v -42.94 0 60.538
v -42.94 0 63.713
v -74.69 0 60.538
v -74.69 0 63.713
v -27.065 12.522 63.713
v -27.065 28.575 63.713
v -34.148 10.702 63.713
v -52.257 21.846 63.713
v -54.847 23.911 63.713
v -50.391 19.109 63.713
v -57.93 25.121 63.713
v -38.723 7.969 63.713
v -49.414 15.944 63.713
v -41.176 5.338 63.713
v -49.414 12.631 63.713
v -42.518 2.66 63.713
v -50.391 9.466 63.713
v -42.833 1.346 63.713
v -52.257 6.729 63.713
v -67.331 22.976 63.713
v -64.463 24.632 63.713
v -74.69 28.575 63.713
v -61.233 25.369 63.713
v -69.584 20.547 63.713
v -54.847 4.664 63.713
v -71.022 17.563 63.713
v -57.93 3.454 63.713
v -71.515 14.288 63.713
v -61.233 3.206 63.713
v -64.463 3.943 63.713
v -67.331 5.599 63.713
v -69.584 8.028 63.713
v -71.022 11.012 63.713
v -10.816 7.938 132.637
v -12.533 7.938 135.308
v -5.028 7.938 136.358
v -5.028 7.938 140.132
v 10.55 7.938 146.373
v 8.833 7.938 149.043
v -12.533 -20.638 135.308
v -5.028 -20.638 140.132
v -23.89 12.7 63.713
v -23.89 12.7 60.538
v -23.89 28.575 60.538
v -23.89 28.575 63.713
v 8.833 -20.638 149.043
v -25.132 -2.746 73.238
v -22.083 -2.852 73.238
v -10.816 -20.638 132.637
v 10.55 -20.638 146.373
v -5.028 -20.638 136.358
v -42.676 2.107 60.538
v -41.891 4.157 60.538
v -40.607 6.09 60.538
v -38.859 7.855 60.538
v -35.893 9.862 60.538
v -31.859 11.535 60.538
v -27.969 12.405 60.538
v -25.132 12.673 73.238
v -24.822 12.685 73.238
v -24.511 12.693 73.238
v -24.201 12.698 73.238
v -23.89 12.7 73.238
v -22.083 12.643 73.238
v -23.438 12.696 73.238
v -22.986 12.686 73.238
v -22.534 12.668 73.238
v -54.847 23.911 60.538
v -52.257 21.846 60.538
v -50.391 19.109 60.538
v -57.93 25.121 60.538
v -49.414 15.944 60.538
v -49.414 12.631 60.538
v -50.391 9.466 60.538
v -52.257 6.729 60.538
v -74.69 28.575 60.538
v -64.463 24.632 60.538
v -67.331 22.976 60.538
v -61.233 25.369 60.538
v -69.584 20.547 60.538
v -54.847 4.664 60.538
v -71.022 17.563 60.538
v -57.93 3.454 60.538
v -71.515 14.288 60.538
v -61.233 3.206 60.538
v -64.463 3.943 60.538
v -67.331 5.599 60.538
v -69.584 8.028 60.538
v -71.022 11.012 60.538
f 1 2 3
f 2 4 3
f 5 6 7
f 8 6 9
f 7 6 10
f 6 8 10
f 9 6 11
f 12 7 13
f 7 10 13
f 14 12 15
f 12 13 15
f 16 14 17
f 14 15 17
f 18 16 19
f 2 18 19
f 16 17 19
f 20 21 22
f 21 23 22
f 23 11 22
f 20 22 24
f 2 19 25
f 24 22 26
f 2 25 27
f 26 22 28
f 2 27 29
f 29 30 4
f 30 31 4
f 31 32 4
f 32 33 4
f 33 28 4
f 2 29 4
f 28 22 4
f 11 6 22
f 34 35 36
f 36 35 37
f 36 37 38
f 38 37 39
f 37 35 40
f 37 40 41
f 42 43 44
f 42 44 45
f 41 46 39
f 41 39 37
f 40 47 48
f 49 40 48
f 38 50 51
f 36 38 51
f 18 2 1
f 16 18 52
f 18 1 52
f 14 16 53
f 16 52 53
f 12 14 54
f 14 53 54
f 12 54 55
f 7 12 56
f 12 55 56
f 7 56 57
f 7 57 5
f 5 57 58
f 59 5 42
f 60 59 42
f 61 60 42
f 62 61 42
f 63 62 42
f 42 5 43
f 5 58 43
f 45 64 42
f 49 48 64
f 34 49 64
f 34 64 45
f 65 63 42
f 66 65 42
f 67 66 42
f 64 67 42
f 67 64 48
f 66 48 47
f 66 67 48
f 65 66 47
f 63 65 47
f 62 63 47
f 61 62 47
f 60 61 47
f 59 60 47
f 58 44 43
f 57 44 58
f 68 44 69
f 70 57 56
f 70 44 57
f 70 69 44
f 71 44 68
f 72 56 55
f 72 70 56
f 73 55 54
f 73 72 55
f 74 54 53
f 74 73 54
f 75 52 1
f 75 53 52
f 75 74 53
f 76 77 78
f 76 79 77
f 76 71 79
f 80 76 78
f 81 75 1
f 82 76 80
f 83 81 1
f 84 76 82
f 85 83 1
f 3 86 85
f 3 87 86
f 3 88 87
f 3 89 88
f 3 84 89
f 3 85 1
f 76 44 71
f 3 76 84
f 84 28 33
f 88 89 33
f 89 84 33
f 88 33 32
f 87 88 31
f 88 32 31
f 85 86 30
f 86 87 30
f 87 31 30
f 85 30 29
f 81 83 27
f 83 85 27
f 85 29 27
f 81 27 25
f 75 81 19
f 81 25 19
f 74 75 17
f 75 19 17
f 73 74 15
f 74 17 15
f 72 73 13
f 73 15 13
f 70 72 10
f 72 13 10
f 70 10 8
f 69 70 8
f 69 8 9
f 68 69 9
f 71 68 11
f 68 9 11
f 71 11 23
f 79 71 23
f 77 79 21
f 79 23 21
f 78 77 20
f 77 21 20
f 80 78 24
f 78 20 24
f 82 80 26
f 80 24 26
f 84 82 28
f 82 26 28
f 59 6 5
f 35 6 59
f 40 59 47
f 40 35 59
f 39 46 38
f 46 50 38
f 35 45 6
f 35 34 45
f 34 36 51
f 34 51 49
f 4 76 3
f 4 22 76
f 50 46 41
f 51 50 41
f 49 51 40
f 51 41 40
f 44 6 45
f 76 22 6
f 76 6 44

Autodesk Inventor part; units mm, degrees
ref_plane "YZ Plane" through (0, 0, 0) normal (1, 0, 0) x (0, 1, 0)
ref_plane "XZ Plane" through (0, 0, 0) normal (0, 1, 0) x (-1, 0, 0)
sketch "Sketch1" plane through (0, 0, 0) normal (0, 1, 0) x (-1, 0, 0)
  line L0 (43.0137, 64.3915) -> (32.1817, 14.8739)
  line L1 (-10.5502, -12.5966) -> (-8.8333, -15.2673)
  line L2 (-8.8333, -15.2673) -> (35.0028, 12.913)
  line L3 (35.0028, 12.913) -> (46.1153, 63.713)
  line L4 (46.1153, 63.713) -> (43.0137, 64.3915)
  line L5 (-10.5502, -12.5966) -> (-10.5502, 12.913)
  line L6 (-10.5502, -12.5966) -> (32.1817, 14.8739)
  line L7 (46.1153, 63.713) -> (74.6903, 63.713)
  line L8 (74.6903, 63.713) -> (74.6903, 66.888)
  line L9 (74.6903, 66.888) -> (43.5598, 66.888)
  line L10 (43.0137, 64.3915) -> (43.5598, 66.888)
  point P0 (0, 0)
  dimension "d0" = 3.175
  dimension "d1" = 3.175
  dimension "d3" = 50.8
  dimension "d4" = 57.265
  dimension "d5" = 50.8
  dimension "d6" = 11.1125
  dimension "d7" = 28.575
  dimension "d8" = 3.175
extrude "Extrusion1" add sketch "Sketch1" along normal blind 28.575
sketch "Sketch2" plane through (-74.6903, 0, 66.888) normal (0, 0, 1) x (1, 0, 0)
  line L0 (28.575, 0) -> (0, 0) projected
  line L1 (0, 0) -> (0, 28.575) projected
  line L2 (28.575, 28.575) -> (0, 28.575) projected
  line L3 (28.575, 0) -> (28.575, 28.575) projected
  line L4 (28.575, 28.575) -> (0, 28.575) projected
  line L5 (0, 0) -> (0, 28.575) projected
  circle A0 centre (14.2875, 14.2875) radius 11.1125
  point P0 (74.6903, 0)
  point P1 (14.2875, 28.575)
  point P2 (0, 14.2875)
  dimension "d11" = 22.225
extrude "Extrusion2" cut sketch "Sketch2" against normal blind 28.575 contours A0
sketch "Sketch3" plane through (10.5502, 0, -12.5966) normal (0.5407576, 0, 0.8411785) x (0.8411785, 0, -0.5407576)
  line L0 (-50.8, 0) -> (-50.8, 28.575) projected
  line L1 (-50.8, 7.9375) -> (0, 7.9375)
  line L2 (0, 7.9375) -> (0, -20.6375)
  line L3 (0, -20.6375) -> (-50.8, -20.6375)
  line L4 (-50.8, -20.6375) -> (-50.8, 7.9375)
  line L5 (-50.8, 28.575) -> (0, 28.575) projected
  point P0 (-15.6863, 0)
  dimension "d14" = 50.8
  dimension "d15" = 28.575
  dimension "d16" = 20.6375
sketch "Sketch4" plane through (-32.1817, 0, 14.8739) normal (0.9769, 0, 0.2136969) x (0.2136969, 0, -0.9769)
  line L0 (-53.2441, 0) -> (-53.2441, 28.575) projected
  line L1 (-53.2441, 28.575) -> (0, 7.9375)
  line L2 (0, 0) -> (0, 28.575) projected
  line L3 (0, 7.9375) -> (0, -20.6375)
  line L4 (0, -20.6375) -> (-53.2441, 0)
  line L5 (-53.2441, 28.575) -> (-53.2441, 0)
  point P0 (21.4074, 0)
  dimension "d17" = 20.6375
  dimension "d18" = 28.575
sketch "Sketch5" plane through (-32.1817, 0, 14.8739) normal (0.9769, 0, 0.2136969) x (0.2136969, 0, -0.9769)
  line L0 (-53.2441, 41.9678) -> (42.8737, 41.9678)
  line L1 (42.8737, 41.9678) -> (42.8737, -28.4609)
  line L2 (42.8737, -28.4609) -> (-53.2441, -28.4609)
  line L3 (-53.2441, -28.4609) -> (-53.2441, 41.9678)
  point P0 (21.4074, 0)
extrude "Extrusion3" cut sketch "Sketch5" along normal blind 50.8 and the other way blind 3.175
extrude "Extrusion4" add sketch "Sketch4" against normal blind 3.175
extrude "Extrusion5" add sketch "Sketch3" against normal blind 3.175
sketch "Sketch6" plane through (8.8333, 0, -15.2673) normal (-0.5407576, 0, -0.8411785) x (-0.8411785, 0, 0.5407576)
  line L0 (50.8, 7.9375) -> (0, 7.9375) projected
  line L1 (50.8, 7.9375) -> (63.8738, 7.9375)
  line L2 (63.8738, 7.9375) -> (63.8738, -20.6375)
  line L3 (63.8738, -20.6375) -> (50.8, -20.6375)
  line L4 (50.8, -20.6375) -> (50.8, 7.9375)
  point P0 (15.6863, 0)
extrude "Extrusion6" add sketch "Sketch6" against normal blind 3.175
sketch "Sketch7" plane through (-35.2833, 0, 14.1954) normal (-0.9769, 0, -0.2136969) x (-0.2136969, 0, 0.9769)
  line L0 (50.6885, 27.5845) -> (0, 7.9375) projected
  line L1 (3.1832, -19.4037) -> (53.2441, 0) projected
  line L2 (0, 7.9375) -> (3.1832, 7.9375) projected
  line L3 (0, 7.9375) -> (-56.9759, -14.1465)
  line L4 (-56.9759, -14.1465) -> (-50.1301, -40.068)
  line L5 (53.2441, 0) -> (0, -20.6375) projected
  line L6 (-50.1301, -40.068) -> (0, -20.6375)
  line L7 (0, 7.9375) -> (-35.9676, 7.9375) projected
  line L8 (0, 7.9375) -> (0, -20.6375)
  line L9 (11.5155, 12.4009) -> (21.1446, -12.4418)
  line L10 (-34.1585, 31.8696) -> (27.6424, 31.8696)
  line L11 (27.6424, 31.8696) -> (27.6424, -37.0154)
  line L12 (27.6424, -37.0154) -> (-34.1585, -37.0154)
  line L13 (-34.1585, -37.0154) -> (-34.1585, 31.8696)
  point P0 (-21.4074, 0)
extrude "Extrusion7" cut sketch "Sketch7" along normal blind 25.4 contours L9 L1 L5 L8 L0 | L0 L7 L13 L10 L11 | L0 L11 L1 L9 | L8 L6 L13 L3 | L3 L13 L7 | L1 L11 L12 L13 L6 L5
mirror "Mirror1" about plane through (-74.6903, 0, 66.888) normal (0, 0, 1)
sketch "Sketch8" plane through (0, 28.575, 0) normal (0, 1, 0) x (1, 0, 0)
  line L0 (-74.6903, -63.713) -> (-74.6903, -70.063) projected
  line L1 (-74.6903, -66.888) -> (15.7413, -66.888)
  line L2 (15.7413, -66.888) -> (15.7413, 23.0839)
  line L3 (15.7413, 23.0839) -> (-74.6903, 23.0839)
  line L4 (-74.6903, 23.0839) -> (-74.6903, -66.888)
  point P0 (0, 0)
extrude "Extrusion8" cut sketch "Sketch8" against normal blind 49.2125
ref_plane "Work Plane1" through (-7.3684, -20.6375, 113.4742) normal (0.9769, 0, -0.2136969) x (-0.2136969, 0, -0.9769)
sketch "Sketch10" plane through (0, 28.575, 0) normal (0, 1, 0) x (1, 0, 0)
  line L0 (-1.9264, -138.3519) -> (-5.0281, -139.0304)
  line L1 (-1.9264, -138.3519) -> (-13.3045, -86.3378) projected
  line L2 (-46.6614, -54.5282) -> (-5.0281, -54.5282)
  line L3 (-5.0281, -54.5282) -> (-5.0281, -144.0467)
  line L4 (-5.0281, -144.0467) -> (-46.6614, -144.0467)
  line L5 (-46.6614, -144.0467) -> (-46.6614, -54.5282)
  point P0 (0, 0)
  dimension "d35" = 3.175
extrude "Extrusion9" cut sketch "Sketch10" against normal blind 57.15 contours L3 L4 L5 L2
sketch "Sketch11" plane through (0, 28.575, 0) normal (0, 1, 0) x (1, 0, 0)
  line L0 (-74.6903, -66.888) -> (-46.6614, -66.888) projected
  line L1 (-46.6614, -66.888) -> (-46.1153, -66.888)
  line L2 (-46.1153, -66.888) -> (-46.1153, -70.063)
  line L3 (-46.1153, -70.063) -> (-46.6614, -70.063)
  line L4 (-46.6614, -70.063) -> (-46.6614, -66.888)
  line L5 (-74.6903, -66.888) -> (-74.6903, -70.063) projected
  point P0 (0, 0)
  dimension "d38" = 28.575
extrude "Extrusion10" add sketch "Sketch11" against normal up to surface (28.575 mm away)
sketch "Sketch12" plane through (-74.6903, 0, 66.888) normal (0, 0, -1) x (-1, 0, 0)
  line L0 (0, 0) -> (-28.575, 0) projected
  line L1 (0, 28.575) -> (0, 0) projected
  line L2 (-28.575, 28.575) -> (0, 28.575) projected
  line L3 (-28.575, 28.575) -> (-28.575, 0) projected
  circle A0 centre (-14.2875, 14.2875) radius 11.1125 projected
  point P0 (-74.6903, 0)
extrude "Extrusion11" add sketch "Sketch12" along normal blind 6.35
sketch "Sketch13" plane through (-74.6903, 0, 70.063) normal (0, 0, 1) x (1, 0, 0)
  line L0 (28.575, 28.575) -> (0, 28.575) projected
  line L1 (0, 0) -> (0, 28.575) projected
  line L2 (28.575, 0) -> (0, 0) projected
  line L3 (28.575, 28.575) -> (28.575, 0) projected
  circle A0 centre (14.2875, 14.2875) radius 11.1125 projected
  point P0 (74.6903, 0)
extrude "Extrusion12" cut sketch "Sketch13" against normal blind 6.35
sketch "Sketch14" plane through (-7.3684, -20.6375, 113.4742) normal (0.9769, 0, -0.2136969) x (-0.2136969, 0, -0.9769)
  line L0 (-22.8553, 28.575) -> (-26.5426, 28.575) projected
  line L1 (59.9935, 49.2125) -> (59.9935, 20.6375) projected
  line L2 (-22.8553, 28.575) -> (59.9935, 49.2125)
  line L3 (59.9935, 20.6375) -> (66.0999, 20.6375) projected
  line L4 (59.9935, 49.2125) -> (59.9935, 20.6375)
  line L5 (-22.8553, 0) -> (-22.8553, 28.575) projected
  line L6 (59.9935, 20.6375) -> (-22.8553, 0)
  line L7 (-22.8553, 0) -> (-22.8553, 28.575)
  point P0 (109.2784, 20.6375)
extrude "Extrusion13" add sketch "Sketch14" against normal blind 3.175
sketch "Sketch16" plane through (-46.1153, 0, 60.538) normal (1, 0, 0) x (0, 0, -1)
  line L0 (-3.175, 28.575) -> (-3.175, 0) projected
  line L1 (-3.175, 0) -> (0, 0) projected
  line L2 (0, 28.575) -> (0, 0) projected
  line L3 (-3.175, 28.575) -> (0, 28.575) projected
  point P0 (60.538, 0)
extrude "Extrusion14" add sketch "Sketch16" along normal blind 33.3375
sketch "Sketch17" plane through (-7.3684, -20.6375, 113.4742) normal (0.9769, 0, -0.2136969) x (-0.2136969, 0, -0.9769)
  line L0 (39.8727, 61.7245) -> (70.5453, 61.7245)
  line L1 (70.5453, 61.7245) -> (70.5453, 3.8032)
  line L2 (70.5453, 3.8032) -> (39.8727, 3.8032)
  line L3 (39.8727, 3.8032) -> (39.8727, 61.7245)
  point P0 (109.2784, 20.6375)
extrude "Extrusion15" cut sketch "Sketch17" along normal blind 33.3375
sketch "Sketch18" plane through (0, 28.575, 0) normal (0, 1, 0) x (1, 0, 0)
  line L0 (-74.6903, -60.538) -> (-18.9482, -60.538) projected
  line L1 (-26.1324, -60.538) -> (-14.0387, -60.538)
  line L2 (-14.0387, -60.538) -> (-14.0387, -48.514)
  line L3 (-14.0387, -48.514) -> (-26.1324, -48.514)
  line L4 (-26.1324, -48.514) -> (-26.1324, -60.538)
  point P0 (0, 0)
extrude "Extrusion16" cut sketch "Sketch18" against normal blind 33.3375
sketch "Sketch19" plane through (0, 28.575, 0) normal (0, 1, 0) x (1, 0, 0)
  line L0 (-21.5038, -63.713) -> (-74.6903, -63.713) projected
  line L1 (-28.5092, -63.713) -> (0.9764, -63.713)
  line L2 (0.9764, -63.713) -> (0.9764, -136.358)
  line L3 (0.9764, -136.358) -> (-28.5092, -136.358)
  line L4 (-28.5092, -136.358) -> (-28.5092, -63.713)
  point P0 (0, 0)
extrude "Extrusion17" cut sketch "Sketch19" against normal blind 82.55
sketch "Sketch20" plane through (0, 28.575, 0) normal (0, 1, 0) x (1, 0, 0)
  line L0 (-74.6903, -60.538) -> (-22.1983, -60.538) projected
  line L1 (-21.5038, -63.713) -> (-74.6903, -63.713) projected
  line L2 (-74.6903, -60.538) -> (-23.8903, -60.538)
  line L3 (-23.8903, -60.538) -> (-23.8903, -63.713)
  line L4 (-23.8903, -63.713) -> (-74.6903, -63.713)
  line L5 (-74.6903, -63.713) -> (-74.6903, -60.538)
  line L6 (-23.8903, -55.4967) -> (-9.2163, -55.4967)
  line L7 (-9.2163, -55.4967) -> (-9.2163, -75.9107)
  line L8 (-9.2163, -75.9107) -> (-23.8903, -75.9107)
  line L9 (-23.8903, -75.9107) -> (-23.8903, -55.4967)
  point P0 (0, 0)
  dimension "d55" = 50.8
extrude "Extrusion18" cut sketch "Sketch20" against normal blind 82.55 contours L9 L6 L7 L8 L3
sketch "Sketch21" plane through (-5.0281, 7.9375, 140.1325) normal (0, 1, 0) x (1, 0, 0)
  line L0 (15.5783, -6.2401) -> (13.8614, -8.9109) projected
  line L1 (13.8614, -8.9109) -> (15.5783, -6.2401)
  line L2 (15.5783, -6.2401) -> (-5.7877, 7.4951)
  line L3 (-5.7877, 7.4951) -> (-7.5046, 4.8244)
  line L4 (-7.5046, 4.8244) -> (13.8614, -8.9109)
  point P0 (5.0281, 140.1325)
  dimension "d58" = 25.4
extrude "Extrusion19" add sketch "Sketch21" against normal blind 28.575
sketch "Sketch22" plane through (-5.6127, 7.9375, 136.358) normal (0, 1, 0) x (1, 0, 0)
  line L0 (-48.2657, 34.2615) -> (88.3828, 30.5881)
  line L1 (88.3828, 30.5881) -> (85.9509, -59.8767)
  line L2 (85.9509, -59.8767) -> (-50.6975, -56.2034)
  line L3 (-50.6975, -56.2034) -> (-48.2657, 34.2615)
  point P0 (5.6127, 136.358)
extrude "Extrusion20" cut sketch "Sketch22" along normal blind 28.575
sketch "Sketch23" plane through (-74.6903, 0, 63.713) normal (0, 0, 1) x (1, 0, 0)
  line L0 (0, 28.575) -> (50.8, 28.575) projected
  line L1 (50.8, 0) -> (0, 0) projected
  line L2 (50.8, 28.575) -> (47.625, 28.575)
  line L3 (47.625, 28.575) -> (47.625, 0)
  line L4 (47.625, 0) -> (50.8, 0)
  line L5 (50.8, 0) -> (50.8, 28.575)
  point P0 (74.6903, 0)
  dimension "d63" = 3.175
loft "Loft1" add profiles "Sketch23" section 2 edges at (-11.6742, 7.9375, 133.9728) (-10.8157, -6.35, 132.6374) (-11.6742, -20.6375, 133.9728) (-12.5326, -6.35, 135.3081)
sketch "Sketch26" plane through (-74.6903, 0, 60.538) normal (0, 0, -1) x (-1, 0, 0)
  line L0 (-50.8, 0) -> (-50.8, 28.575) projected
  ellipse E0 centre (-50.8, 0) end of major axis (-31.75, 0) minor radius 12.7
  point P0 (-74.6903, 0)
  dimension "d71" = 12.7
  dimension "d72" = 19.05
extrude "Extrusion22" cut sketch "Sketch26" against normal blind 12.7
properties part number "Spinner to Top Other Side"
